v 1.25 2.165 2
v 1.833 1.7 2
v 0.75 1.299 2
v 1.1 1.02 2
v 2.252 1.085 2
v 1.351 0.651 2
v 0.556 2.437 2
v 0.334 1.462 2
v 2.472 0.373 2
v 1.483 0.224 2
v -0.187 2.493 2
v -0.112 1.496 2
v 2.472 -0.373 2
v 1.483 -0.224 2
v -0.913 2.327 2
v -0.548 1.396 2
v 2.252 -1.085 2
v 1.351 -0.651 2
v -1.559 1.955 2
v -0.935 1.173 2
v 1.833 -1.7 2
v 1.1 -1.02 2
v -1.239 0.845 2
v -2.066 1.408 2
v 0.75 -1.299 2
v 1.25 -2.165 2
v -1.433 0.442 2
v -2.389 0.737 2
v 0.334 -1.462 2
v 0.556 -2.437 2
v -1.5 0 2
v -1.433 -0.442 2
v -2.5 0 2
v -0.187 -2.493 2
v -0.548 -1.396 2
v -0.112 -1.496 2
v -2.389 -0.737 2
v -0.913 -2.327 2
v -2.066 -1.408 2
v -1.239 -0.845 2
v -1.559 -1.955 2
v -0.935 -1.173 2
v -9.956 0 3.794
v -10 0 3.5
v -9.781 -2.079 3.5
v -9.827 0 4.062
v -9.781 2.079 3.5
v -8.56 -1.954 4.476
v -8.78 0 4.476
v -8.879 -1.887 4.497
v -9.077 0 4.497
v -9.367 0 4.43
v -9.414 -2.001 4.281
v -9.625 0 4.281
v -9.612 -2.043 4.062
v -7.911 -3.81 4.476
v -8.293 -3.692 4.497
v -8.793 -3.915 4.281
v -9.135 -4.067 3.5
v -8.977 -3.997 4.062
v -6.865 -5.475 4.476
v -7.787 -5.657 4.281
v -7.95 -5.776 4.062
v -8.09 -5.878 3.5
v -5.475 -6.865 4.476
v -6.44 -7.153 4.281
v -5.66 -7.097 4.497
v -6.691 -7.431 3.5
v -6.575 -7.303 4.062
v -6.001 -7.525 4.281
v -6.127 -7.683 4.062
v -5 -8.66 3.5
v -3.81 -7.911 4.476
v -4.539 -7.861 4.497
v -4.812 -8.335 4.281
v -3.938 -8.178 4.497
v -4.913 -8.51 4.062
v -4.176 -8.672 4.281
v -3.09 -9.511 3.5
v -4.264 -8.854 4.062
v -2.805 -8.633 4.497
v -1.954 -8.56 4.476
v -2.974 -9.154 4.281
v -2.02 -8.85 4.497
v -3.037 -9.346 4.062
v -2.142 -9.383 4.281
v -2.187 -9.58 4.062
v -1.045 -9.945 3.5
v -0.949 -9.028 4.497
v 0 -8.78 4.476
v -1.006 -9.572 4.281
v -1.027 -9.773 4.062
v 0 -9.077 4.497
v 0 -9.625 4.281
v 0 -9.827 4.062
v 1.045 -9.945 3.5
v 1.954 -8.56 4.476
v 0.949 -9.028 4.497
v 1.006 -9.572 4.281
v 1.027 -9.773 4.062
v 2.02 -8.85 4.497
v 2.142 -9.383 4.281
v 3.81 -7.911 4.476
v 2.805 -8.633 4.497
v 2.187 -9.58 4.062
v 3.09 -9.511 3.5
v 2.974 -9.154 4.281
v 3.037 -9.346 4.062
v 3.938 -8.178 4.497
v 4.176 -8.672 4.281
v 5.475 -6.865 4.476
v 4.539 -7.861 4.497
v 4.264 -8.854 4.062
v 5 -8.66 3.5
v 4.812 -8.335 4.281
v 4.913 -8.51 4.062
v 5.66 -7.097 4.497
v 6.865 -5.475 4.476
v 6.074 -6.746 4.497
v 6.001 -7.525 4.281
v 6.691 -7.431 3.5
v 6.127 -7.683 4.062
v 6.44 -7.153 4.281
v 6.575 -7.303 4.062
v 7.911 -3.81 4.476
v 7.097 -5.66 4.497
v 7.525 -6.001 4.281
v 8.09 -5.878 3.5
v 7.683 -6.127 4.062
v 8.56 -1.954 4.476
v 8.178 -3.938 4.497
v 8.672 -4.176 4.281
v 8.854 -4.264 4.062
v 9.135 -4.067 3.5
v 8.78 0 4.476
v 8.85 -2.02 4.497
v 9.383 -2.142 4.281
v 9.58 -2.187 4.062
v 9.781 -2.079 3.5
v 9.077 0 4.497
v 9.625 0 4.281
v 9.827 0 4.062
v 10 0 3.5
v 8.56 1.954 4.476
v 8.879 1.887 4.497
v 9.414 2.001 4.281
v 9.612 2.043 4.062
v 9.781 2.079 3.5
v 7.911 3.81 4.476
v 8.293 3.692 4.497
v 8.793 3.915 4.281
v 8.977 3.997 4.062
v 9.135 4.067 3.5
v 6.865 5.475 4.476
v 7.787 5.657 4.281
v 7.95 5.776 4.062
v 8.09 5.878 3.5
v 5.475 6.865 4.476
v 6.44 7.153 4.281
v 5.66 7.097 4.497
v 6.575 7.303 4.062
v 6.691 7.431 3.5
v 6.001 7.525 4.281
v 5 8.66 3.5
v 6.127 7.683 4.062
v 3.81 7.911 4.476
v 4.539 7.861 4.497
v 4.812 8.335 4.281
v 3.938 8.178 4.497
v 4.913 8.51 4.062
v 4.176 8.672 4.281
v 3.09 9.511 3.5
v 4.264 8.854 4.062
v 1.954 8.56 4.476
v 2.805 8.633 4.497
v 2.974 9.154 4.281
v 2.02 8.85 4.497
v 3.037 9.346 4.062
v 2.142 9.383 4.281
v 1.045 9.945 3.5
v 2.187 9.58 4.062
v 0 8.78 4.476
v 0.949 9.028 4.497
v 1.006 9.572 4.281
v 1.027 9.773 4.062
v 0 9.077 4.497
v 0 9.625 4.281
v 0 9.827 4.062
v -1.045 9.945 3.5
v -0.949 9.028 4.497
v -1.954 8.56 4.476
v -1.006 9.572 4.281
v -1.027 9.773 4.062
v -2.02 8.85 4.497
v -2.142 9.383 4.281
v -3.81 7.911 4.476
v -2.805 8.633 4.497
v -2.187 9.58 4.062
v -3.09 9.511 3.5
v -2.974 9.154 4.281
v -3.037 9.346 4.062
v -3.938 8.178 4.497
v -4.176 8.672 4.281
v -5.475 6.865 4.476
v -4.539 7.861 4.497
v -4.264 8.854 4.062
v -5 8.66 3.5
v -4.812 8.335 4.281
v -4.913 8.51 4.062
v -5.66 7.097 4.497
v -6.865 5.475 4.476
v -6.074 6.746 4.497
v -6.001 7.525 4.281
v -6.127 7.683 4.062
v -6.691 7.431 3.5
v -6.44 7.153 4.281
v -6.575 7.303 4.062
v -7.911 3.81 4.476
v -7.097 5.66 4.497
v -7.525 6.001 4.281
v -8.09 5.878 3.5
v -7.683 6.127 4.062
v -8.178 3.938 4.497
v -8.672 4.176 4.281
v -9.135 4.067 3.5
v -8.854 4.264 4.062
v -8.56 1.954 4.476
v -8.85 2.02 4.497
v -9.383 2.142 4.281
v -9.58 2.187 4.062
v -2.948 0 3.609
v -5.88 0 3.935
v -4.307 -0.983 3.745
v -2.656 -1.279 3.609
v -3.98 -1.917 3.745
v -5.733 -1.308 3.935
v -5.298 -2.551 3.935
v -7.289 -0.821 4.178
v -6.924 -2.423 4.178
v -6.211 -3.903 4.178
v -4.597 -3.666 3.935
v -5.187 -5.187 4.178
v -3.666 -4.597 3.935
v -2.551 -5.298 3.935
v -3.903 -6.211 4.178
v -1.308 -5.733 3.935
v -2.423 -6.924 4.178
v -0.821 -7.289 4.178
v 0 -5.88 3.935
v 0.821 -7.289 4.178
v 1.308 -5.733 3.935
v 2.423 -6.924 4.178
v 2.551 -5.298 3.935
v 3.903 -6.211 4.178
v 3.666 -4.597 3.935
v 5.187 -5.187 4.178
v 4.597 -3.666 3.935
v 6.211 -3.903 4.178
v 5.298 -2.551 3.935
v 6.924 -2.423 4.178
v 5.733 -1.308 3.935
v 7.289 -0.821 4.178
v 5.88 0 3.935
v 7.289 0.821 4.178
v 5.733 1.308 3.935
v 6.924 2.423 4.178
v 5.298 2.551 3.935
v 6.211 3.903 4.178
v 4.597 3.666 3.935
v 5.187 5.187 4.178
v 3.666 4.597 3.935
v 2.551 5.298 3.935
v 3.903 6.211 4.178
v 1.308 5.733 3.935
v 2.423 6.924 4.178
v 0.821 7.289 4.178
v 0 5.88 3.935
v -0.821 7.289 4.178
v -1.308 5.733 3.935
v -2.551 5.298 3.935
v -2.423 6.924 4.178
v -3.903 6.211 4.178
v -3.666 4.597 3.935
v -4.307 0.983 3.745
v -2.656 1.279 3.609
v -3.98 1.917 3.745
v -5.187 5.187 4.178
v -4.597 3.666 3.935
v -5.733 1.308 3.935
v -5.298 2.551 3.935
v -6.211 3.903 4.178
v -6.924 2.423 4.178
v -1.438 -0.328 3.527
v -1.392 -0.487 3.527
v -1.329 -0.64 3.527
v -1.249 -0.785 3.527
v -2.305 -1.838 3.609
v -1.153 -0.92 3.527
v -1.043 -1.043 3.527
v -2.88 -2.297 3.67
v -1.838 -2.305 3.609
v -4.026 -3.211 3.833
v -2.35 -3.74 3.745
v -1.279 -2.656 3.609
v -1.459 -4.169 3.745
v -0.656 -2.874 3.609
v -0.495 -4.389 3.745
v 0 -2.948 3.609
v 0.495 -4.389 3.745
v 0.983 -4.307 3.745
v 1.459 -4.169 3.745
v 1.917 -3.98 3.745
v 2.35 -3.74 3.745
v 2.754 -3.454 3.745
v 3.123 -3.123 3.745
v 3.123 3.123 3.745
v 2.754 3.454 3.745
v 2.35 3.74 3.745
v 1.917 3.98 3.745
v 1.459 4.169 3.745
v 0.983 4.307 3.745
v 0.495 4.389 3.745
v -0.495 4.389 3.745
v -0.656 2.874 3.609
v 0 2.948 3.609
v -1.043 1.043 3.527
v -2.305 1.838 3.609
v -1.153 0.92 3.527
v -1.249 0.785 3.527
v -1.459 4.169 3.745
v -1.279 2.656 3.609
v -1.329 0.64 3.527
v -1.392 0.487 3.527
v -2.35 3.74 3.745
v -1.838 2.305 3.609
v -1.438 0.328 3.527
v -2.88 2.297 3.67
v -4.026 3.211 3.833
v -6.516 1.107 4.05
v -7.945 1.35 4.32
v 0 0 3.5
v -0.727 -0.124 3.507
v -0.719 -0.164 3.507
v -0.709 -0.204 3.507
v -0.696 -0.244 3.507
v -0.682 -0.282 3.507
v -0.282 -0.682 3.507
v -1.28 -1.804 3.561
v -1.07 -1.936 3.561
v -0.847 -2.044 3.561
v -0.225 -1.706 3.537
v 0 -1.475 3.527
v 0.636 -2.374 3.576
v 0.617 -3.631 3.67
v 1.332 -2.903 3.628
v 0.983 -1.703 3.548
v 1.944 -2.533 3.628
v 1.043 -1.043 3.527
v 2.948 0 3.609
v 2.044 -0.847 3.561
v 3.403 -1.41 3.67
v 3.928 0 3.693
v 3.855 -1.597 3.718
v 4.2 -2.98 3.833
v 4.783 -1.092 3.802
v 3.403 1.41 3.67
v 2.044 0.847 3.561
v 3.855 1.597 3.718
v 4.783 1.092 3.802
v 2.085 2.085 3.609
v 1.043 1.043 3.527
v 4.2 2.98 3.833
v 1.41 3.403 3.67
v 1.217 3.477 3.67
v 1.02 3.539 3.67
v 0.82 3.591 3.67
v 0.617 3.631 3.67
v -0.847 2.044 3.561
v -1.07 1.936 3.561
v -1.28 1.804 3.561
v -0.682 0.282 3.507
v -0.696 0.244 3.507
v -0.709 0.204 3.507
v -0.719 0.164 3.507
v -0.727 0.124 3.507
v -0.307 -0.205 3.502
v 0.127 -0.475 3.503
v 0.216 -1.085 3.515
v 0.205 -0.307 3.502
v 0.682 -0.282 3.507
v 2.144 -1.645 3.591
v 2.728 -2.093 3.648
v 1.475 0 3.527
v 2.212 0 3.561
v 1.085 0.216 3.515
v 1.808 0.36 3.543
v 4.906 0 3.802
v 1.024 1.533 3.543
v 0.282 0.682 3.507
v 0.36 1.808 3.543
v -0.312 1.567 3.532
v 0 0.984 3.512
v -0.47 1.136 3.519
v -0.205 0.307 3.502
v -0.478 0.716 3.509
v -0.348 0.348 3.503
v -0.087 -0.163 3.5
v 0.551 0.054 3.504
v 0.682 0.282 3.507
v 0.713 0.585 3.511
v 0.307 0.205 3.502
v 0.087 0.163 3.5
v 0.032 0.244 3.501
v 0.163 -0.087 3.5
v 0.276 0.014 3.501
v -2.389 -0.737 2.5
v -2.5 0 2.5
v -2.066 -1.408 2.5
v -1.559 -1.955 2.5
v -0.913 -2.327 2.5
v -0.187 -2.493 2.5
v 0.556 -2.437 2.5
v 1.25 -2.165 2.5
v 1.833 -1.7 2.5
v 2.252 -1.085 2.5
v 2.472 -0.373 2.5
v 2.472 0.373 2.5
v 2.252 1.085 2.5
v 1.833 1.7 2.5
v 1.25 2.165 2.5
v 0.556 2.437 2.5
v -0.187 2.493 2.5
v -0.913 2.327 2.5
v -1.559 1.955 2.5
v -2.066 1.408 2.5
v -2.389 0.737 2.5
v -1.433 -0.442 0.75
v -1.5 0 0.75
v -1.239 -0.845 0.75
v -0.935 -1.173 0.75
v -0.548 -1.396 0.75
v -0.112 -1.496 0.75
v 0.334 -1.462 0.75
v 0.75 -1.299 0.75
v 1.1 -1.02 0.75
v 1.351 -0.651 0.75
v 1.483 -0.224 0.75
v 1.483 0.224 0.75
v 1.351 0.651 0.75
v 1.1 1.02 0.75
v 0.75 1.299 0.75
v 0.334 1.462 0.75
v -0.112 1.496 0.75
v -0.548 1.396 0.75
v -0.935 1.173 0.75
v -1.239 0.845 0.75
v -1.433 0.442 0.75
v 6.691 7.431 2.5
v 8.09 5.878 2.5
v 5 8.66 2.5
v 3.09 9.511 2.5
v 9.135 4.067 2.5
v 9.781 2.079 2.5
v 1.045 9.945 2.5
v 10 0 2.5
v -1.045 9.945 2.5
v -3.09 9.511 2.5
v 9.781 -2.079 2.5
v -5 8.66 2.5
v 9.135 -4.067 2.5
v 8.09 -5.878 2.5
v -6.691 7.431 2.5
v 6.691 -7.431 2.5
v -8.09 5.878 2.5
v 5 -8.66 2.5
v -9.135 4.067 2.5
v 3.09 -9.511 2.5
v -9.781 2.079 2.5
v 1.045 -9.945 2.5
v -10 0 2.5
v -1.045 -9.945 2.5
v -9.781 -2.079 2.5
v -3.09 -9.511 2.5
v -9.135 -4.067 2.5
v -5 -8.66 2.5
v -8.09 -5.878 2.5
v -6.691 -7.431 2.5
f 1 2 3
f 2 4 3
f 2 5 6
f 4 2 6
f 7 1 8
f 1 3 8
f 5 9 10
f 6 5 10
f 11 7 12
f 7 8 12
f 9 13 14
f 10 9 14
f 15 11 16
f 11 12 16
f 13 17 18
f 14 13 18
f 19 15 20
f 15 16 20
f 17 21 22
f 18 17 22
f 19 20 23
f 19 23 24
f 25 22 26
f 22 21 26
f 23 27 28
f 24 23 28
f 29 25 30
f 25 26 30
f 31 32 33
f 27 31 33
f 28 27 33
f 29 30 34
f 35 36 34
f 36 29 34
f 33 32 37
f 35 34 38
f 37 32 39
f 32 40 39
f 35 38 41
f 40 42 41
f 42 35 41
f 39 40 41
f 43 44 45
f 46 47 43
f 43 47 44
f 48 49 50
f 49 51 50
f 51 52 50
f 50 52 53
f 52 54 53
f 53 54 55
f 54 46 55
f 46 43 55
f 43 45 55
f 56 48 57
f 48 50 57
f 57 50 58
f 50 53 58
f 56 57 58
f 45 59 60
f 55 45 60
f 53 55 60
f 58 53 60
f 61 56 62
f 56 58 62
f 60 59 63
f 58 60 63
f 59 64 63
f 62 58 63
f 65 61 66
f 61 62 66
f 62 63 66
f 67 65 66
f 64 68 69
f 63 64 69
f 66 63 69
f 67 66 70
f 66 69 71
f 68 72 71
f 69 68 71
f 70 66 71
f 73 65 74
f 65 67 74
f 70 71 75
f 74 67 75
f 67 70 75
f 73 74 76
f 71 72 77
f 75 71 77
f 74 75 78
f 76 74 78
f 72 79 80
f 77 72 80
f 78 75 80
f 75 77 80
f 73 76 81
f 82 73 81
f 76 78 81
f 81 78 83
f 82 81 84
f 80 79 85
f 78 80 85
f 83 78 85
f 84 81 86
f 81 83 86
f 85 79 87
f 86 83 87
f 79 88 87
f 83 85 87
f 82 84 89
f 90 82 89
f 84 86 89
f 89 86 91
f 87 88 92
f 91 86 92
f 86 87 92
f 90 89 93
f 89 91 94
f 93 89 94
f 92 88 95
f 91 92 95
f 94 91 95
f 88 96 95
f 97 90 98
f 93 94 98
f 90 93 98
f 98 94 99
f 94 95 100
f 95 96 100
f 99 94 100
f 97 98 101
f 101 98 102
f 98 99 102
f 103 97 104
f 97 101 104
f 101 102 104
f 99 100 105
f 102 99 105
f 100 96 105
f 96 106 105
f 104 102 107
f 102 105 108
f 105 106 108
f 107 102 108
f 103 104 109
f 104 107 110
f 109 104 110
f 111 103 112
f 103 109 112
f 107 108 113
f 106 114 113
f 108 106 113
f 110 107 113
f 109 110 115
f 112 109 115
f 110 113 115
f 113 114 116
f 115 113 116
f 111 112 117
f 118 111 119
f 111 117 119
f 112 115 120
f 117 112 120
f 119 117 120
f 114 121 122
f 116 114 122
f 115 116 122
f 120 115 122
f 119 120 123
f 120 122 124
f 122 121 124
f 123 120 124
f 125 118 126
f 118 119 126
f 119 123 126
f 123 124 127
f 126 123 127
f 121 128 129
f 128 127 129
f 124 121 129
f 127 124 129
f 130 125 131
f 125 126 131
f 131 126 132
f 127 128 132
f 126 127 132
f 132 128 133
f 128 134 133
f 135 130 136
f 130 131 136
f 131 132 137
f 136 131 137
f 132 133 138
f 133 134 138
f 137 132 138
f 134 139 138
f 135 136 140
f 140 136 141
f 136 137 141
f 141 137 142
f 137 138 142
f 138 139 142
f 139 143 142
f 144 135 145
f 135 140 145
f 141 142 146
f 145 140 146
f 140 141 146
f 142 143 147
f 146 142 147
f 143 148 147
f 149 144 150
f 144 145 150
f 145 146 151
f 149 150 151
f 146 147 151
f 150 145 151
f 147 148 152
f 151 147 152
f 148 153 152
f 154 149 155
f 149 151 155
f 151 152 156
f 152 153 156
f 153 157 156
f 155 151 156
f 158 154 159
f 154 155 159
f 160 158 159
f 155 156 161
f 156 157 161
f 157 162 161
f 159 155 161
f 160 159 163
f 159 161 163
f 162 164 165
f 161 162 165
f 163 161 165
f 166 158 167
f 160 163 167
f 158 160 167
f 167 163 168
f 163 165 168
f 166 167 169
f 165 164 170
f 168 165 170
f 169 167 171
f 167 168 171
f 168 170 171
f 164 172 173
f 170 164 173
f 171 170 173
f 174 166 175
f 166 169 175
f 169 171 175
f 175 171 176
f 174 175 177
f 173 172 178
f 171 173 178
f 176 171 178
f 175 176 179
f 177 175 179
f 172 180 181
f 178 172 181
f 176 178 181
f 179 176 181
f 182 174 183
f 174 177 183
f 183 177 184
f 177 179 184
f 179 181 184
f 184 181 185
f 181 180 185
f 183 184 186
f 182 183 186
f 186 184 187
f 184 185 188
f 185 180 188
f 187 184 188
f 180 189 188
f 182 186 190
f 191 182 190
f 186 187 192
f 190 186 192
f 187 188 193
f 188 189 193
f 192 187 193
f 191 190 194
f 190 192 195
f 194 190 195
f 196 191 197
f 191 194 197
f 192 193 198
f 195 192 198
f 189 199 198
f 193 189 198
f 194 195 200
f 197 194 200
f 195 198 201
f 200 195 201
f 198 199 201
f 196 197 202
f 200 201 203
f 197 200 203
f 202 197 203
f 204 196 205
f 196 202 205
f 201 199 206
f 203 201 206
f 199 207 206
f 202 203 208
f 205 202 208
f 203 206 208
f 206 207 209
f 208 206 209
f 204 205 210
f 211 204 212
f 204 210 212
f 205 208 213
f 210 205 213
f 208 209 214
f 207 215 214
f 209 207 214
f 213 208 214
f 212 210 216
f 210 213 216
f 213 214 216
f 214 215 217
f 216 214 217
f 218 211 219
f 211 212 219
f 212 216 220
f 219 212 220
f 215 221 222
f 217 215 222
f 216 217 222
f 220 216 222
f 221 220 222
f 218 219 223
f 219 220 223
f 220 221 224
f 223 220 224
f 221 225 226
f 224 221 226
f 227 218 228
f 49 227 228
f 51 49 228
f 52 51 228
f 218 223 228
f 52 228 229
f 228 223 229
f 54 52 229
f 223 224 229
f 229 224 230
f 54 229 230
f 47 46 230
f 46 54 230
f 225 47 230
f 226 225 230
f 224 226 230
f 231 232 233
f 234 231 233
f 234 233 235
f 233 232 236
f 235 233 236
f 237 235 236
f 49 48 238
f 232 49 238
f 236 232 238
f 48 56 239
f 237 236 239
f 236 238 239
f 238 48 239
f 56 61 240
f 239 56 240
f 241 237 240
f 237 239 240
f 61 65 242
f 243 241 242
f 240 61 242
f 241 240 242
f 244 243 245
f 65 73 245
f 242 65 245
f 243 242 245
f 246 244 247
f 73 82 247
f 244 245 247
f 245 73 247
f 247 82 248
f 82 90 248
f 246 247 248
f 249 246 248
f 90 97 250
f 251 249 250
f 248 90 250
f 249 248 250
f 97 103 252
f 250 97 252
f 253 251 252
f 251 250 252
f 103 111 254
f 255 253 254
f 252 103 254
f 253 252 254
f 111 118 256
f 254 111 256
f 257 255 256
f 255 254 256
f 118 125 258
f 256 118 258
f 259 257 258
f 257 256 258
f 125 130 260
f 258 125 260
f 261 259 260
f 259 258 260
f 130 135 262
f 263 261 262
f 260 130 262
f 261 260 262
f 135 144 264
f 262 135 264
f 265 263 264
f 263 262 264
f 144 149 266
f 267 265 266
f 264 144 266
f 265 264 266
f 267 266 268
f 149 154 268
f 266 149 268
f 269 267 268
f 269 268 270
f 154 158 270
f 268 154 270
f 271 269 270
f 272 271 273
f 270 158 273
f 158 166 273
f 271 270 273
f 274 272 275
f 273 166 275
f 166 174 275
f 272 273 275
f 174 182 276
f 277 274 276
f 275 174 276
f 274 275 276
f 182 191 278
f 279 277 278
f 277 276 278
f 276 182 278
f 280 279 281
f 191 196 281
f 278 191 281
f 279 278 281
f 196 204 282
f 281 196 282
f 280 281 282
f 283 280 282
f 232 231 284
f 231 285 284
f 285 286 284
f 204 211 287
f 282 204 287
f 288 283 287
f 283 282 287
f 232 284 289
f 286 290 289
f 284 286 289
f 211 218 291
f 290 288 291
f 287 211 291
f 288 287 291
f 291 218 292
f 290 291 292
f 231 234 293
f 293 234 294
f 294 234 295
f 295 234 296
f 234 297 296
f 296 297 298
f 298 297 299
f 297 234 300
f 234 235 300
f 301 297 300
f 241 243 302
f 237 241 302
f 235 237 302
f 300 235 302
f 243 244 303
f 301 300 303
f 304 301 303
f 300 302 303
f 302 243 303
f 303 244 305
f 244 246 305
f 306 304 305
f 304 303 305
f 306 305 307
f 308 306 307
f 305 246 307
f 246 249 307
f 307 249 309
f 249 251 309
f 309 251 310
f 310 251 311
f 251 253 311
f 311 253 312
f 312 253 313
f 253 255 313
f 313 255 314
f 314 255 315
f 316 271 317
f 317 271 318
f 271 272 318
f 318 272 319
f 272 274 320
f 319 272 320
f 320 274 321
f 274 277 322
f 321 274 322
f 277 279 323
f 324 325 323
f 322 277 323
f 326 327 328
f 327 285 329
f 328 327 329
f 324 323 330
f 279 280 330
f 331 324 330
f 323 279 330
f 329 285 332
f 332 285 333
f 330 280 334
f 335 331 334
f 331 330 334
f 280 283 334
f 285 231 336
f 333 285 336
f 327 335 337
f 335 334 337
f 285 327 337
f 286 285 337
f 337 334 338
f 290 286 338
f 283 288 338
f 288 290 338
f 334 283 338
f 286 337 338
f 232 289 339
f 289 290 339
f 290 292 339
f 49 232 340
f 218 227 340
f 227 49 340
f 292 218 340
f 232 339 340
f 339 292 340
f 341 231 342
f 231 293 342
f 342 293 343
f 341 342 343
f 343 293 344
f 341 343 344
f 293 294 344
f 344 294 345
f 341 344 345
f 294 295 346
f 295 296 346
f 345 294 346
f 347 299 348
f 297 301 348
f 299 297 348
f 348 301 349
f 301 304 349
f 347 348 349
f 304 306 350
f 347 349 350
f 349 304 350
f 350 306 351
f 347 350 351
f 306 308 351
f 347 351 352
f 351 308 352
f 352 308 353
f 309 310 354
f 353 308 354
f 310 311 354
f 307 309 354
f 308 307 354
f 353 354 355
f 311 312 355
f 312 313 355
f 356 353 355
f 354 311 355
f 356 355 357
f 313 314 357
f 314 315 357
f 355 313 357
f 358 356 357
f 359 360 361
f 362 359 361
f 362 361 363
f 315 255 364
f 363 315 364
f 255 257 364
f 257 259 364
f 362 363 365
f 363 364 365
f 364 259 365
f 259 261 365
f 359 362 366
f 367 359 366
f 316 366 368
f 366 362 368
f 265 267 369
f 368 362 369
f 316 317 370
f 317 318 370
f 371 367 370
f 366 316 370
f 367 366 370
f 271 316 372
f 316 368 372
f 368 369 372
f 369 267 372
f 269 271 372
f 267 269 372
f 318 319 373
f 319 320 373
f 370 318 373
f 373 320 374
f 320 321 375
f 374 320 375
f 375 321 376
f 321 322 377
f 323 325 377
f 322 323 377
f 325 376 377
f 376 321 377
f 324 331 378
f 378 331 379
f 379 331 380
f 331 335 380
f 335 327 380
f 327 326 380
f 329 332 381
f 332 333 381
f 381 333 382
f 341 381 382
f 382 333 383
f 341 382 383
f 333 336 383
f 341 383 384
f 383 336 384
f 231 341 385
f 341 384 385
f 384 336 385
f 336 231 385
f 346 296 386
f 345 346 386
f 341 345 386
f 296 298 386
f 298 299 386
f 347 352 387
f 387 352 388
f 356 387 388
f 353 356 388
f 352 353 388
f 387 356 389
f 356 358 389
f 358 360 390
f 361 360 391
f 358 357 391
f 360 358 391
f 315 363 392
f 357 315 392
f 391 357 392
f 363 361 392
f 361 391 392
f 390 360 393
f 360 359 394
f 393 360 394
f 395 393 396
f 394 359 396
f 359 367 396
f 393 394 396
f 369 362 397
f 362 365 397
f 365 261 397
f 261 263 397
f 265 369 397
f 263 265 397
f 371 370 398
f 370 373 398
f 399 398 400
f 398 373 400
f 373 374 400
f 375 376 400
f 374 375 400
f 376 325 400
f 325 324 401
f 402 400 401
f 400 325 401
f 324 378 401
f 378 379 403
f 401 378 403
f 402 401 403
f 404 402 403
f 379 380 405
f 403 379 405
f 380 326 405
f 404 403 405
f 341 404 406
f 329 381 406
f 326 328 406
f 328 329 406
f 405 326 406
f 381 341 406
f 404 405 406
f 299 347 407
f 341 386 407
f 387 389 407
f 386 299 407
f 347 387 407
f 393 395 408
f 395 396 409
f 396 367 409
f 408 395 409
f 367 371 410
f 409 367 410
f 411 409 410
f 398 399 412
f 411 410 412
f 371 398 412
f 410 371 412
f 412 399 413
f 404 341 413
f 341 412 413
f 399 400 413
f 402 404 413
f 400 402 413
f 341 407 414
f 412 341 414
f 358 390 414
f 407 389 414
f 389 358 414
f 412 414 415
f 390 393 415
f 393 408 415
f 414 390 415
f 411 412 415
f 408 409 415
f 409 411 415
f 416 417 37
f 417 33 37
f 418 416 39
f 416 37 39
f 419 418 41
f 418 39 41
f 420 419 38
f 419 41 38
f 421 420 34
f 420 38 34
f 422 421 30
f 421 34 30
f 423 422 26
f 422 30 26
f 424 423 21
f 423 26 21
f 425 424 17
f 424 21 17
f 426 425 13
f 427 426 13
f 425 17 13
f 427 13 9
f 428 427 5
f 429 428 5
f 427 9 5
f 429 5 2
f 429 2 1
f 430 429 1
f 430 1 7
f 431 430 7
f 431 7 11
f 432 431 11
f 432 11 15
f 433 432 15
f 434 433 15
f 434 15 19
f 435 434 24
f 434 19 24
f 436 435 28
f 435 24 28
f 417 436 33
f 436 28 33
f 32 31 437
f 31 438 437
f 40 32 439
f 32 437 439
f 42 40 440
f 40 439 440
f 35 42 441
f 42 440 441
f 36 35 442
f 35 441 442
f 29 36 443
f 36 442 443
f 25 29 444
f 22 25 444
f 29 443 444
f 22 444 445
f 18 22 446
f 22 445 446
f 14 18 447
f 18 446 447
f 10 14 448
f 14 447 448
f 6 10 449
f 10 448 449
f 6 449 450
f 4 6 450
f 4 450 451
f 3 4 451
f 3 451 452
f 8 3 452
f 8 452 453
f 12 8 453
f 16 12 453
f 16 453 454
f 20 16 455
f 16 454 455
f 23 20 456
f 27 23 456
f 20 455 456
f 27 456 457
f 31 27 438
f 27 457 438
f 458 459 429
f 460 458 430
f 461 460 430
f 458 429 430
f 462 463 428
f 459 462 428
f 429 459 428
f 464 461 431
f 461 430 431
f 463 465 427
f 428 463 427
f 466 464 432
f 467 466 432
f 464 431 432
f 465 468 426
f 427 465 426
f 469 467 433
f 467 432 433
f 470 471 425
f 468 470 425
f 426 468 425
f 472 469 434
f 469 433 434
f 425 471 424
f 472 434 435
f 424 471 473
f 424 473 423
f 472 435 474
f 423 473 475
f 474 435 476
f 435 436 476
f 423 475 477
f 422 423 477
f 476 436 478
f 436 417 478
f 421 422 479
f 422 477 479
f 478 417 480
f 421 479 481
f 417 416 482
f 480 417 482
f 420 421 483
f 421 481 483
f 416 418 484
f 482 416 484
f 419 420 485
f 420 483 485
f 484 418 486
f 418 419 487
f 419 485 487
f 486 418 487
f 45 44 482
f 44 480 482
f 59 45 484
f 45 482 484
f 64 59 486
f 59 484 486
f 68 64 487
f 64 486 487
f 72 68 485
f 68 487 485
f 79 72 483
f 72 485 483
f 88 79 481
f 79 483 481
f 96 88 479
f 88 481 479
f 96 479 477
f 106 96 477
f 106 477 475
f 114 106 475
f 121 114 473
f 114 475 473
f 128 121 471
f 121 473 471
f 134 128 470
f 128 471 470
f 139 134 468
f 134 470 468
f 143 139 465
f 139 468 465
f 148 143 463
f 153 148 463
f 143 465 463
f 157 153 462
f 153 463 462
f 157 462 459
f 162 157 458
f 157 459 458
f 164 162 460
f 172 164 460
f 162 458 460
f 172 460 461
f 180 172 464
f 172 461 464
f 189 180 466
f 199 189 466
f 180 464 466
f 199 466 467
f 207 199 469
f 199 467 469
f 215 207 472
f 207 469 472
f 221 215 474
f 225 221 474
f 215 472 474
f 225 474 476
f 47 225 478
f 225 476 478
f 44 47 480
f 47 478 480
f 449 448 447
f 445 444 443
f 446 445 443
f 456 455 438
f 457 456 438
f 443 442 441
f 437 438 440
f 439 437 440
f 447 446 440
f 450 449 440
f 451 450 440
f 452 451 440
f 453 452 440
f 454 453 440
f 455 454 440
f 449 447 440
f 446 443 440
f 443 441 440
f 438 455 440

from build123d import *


with BuildPart() as f2:
    # F0 (on Front) → F2 (revolve)
    with BuildSketch(Plane.XZ):
        with BuildLine():
            Line((-10, 2.5), (-3.5, 2.5))
            Line((-3.5, 2.5), (-2.5, 2.5))
            Line((-2.5, 2.5), (-2.5, 2))
            Line((-2.5, 2), (-1.5, 2))
            Line((-1.5, 2), (-1.5, 0.75))
            Line((-1.5, 0.75), (0, 0.75))
            Line((0, 0.75), (0, 3.5))
            ThreePointArc((0, 3.5), (-4.417261, 3.744651), (-8.780488, 4.47561))
            ThreePointArc((-8.780488, 4.47561), (-9.624695, 4.280869), (-10, 3.5))
            Line((-10, 3.5), (-10, 2.5))
        make_face()
    revolve(axis=Axis((0, 0, 5.189829), (0, 0, 1)))


solid = f2.part
